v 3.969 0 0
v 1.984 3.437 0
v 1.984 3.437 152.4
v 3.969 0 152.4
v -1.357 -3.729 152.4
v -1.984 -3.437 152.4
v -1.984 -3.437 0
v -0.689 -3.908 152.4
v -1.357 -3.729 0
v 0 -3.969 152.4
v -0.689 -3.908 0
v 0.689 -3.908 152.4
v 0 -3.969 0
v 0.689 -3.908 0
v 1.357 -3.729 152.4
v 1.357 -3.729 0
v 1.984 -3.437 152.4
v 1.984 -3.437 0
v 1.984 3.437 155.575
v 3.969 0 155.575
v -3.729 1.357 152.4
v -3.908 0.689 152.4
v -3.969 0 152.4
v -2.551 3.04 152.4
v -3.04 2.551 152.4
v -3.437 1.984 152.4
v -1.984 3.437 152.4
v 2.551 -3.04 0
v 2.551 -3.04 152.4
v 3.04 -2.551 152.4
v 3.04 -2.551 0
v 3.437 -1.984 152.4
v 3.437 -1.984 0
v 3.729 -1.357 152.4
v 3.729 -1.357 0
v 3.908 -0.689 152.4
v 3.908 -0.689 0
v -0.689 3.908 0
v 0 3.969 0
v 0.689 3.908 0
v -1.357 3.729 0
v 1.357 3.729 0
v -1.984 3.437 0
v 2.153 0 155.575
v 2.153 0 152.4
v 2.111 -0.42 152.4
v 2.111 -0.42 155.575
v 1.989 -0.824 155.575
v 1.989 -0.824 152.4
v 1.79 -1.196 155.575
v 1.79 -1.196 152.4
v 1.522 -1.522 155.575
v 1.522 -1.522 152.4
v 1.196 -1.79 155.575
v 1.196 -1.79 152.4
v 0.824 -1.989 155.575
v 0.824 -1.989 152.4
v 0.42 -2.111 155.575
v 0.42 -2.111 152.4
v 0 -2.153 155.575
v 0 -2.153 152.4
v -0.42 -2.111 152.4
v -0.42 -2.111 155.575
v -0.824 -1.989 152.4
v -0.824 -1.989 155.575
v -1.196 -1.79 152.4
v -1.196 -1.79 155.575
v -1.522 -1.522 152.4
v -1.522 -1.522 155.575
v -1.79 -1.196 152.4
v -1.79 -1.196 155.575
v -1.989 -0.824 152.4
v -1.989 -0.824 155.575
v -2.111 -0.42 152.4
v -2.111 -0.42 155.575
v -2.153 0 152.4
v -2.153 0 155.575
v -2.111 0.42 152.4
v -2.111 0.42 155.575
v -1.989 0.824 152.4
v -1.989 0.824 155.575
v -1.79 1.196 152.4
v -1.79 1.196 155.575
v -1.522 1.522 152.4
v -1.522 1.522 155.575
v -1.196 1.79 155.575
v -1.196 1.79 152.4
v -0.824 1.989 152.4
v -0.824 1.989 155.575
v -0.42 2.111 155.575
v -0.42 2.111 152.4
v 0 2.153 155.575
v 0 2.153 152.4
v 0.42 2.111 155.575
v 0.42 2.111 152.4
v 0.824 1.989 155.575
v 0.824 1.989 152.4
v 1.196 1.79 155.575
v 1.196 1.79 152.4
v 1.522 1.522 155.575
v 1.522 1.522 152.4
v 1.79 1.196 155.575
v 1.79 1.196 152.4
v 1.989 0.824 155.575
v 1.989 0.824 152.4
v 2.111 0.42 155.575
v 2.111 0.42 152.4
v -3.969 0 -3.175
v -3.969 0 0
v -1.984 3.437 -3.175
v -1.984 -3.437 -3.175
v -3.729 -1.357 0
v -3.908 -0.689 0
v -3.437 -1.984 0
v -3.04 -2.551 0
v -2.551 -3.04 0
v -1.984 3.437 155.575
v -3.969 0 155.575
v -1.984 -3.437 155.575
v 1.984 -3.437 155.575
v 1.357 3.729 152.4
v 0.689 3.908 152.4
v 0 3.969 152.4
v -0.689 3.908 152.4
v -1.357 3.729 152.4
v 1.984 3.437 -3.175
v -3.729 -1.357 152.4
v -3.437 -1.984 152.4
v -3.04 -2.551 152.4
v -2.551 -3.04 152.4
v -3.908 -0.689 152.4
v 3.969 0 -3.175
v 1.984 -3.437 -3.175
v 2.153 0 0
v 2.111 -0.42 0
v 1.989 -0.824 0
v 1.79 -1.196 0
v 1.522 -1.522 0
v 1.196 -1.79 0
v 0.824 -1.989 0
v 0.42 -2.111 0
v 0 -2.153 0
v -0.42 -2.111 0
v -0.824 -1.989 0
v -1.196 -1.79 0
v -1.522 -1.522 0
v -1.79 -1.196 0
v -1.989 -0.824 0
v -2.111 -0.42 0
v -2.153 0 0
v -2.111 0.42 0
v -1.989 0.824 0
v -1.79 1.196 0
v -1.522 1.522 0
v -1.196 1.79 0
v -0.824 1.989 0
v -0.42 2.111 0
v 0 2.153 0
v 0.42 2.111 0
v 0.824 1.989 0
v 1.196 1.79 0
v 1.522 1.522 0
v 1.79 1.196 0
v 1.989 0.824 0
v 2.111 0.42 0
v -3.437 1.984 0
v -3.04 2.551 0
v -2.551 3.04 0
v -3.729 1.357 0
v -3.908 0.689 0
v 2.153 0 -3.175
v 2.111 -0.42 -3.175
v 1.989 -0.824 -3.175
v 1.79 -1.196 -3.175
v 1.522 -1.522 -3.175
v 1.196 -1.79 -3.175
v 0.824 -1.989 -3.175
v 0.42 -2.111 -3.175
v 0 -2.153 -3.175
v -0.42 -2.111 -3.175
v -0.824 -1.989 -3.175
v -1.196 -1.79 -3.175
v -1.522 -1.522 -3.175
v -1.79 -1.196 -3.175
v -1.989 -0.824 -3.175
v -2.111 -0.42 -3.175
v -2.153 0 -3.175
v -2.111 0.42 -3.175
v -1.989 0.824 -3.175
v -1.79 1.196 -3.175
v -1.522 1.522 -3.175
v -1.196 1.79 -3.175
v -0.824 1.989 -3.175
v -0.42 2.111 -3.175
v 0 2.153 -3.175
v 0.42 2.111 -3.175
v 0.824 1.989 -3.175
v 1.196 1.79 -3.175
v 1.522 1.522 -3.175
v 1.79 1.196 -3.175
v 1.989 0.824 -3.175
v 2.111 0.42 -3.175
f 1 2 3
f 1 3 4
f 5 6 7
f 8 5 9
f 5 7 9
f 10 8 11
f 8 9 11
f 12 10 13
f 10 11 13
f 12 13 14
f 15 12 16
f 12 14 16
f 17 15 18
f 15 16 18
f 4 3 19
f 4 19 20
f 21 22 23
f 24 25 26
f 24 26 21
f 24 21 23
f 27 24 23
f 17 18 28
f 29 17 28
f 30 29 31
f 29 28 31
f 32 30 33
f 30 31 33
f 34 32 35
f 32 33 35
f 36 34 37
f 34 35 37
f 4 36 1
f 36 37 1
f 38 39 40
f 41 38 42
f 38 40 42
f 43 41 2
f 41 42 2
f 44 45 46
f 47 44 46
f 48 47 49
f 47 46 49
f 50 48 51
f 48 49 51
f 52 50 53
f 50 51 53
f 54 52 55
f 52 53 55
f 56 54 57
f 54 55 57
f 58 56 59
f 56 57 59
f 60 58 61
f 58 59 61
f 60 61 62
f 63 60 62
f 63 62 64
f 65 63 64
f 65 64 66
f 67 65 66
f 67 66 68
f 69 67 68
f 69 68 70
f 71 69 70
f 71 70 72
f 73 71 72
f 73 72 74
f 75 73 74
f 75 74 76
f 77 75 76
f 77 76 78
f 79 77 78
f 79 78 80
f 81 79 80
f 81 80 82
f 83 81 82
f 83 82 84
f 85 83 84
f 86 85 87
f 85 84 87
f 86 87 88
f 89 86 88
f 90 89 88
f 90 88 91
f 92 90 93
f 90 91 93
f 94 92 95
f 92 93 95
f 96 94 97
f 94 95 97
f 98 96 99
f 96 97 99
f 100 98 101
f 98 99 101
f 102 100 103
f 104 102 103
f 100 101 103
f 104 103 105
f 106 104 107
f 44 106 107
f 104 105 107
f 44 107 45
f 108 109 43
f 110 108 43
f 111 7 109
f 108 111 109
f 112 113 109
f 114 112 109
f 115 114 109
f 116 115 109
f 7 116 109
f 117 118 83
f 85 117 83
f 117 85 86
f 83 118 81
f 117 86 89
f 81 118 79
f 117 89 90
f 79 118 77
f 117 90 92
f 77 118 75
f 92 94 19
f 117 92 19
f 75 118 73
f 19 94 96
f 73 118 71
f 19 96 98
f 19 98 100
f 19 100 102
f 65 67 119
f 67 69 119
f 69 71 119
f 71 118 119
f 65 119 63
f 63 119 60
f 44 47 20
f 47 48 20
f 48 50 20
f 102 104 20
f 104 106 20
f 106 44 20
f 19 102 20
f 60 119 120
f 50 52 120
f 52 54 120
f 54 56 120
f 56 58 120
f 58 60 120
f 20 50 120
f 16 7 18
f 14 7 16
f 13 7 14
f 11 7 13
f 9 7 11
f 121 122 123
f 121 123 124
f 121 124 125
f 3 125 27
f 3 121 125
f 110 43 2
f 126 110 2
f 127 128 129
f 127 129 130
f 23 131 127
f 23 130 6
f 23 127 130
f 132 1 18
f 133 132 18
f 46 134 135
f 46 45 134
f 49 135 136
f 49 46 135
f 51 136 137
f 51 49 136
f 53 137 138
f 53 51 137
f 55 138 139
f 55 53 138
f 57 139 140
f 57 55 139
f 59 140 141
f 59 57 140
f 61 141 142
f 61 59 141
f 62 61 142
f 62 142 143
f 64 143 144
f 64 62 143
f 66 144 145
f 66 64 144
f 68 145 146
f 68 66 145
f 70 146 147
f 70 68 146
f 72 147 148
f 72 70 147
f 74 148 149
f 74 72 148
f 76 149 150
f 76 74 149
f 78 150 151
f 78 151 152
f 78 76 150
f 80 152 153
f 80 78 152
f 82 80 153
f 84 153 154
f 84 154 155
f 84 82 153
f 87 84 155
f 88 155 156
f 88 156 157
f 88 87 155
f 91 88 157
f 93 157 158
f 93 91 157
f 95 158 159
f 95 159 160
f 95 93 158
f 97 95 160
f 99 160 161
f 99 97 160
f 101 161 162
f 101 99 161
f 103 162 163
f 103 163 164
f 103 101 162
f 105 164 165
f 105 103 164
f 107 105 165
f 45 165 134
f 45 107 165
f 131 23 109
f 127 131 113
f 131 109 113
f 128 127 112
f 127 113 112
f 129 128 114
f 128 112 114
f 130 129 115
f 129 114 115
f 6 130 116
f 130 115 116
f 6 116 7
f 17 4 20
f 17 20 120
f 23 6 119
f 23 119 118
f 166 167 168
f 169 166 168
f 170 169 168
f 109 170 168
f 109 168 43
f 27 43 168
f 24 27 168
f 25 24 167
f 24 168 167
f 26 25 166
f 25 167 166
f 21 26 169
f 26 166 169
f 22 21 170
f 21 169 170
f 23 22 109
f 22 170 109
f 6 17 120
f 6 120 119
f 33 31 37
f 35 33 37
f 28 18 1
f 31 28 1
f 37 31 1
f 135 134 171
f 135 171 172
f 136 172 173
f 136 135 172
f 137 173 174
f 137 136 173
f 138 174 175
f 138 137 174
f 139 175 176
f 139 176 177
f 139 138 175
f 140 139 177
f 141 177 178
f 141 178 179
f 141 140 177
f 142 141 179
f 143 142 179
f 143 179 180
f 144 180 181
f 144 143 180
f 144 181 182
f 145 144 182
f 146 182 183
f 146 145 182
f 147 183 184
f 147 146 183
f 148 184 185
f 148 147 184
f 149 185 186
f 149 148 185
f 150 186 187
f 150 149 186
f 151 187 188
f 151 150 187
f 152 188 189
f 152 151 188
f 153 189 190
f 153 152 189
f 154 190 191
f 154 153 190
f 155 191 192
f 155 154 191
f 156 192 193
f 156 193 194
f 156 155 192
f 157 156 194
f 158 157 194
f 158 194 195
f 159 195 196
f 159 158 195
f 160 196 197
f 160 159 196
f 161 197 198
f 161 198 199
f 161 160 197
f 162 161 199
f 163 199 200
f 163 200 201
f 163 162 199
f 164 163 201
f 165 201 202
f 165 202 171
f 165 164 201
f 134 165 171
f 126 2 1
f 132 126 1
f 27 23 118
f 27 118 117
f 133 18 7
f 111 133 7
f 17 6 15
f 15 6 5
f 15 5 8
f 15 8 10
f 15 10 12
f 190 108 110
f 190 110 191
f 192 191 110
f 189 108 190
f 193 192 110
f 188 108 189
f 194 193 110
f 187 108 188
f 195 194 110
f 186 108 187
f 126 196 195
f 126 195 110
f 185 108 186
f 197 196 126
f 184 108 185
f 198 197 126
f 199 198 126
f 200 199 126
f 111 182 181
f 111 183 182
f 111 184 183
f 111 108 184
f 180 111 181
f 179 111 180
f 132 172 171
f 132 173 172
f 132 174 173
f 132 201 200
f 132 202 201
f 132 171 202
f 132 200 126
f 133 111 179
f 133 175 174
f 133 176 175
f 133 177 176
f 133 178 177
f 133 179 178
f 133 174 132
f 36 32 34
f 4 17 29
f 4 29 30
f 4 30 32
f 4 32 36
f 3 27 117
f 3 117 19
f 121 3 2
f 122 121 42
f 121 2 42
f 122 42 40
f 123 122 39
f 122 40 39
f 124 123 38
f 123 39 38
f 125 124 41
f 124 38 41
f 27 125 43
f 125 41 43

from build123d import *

# Parameters (mm, degrees)
F0_R          = 3.96875
F0_R_2        = 2.15265
F1_DEPTH      = 152.4
F3_R          = 2.15265
F4_DEPTH      = 3.175
F4_DEPTH_BACK = 155.575
F5_DEPTH      = 152.4


with BuildPart() as f1:
    # F0 (on Top) → F1 (new body)
    with BuildSketch(Plane.XY):
        Circle(F0_R)
        Circle(F0_R_2, mode=Mode.SUBTRACT)
    extrude(amount=F1_DEPTH)

    # F3 (on face) → F4 (join, two sides)
    with BuildSketch(Plane(origin=(0, 0, 0), x_dir=(1, 0, 0), z_dir=(0, 0, -1))) as f4_sk:
        Polygon((1.984375, -3.4370383213), (3.96875, 0), (1.984375, 3.4370383213), (-1.984375, 3.4370383213), (-3.96875, 0), (-1.984375, -3.4370383213), align=None)
        Circle(F3_R, mode=Mode.SUBTRACT)
    extrude(amount=F4_DEPTH)
    extrude(f4_sk.sketch, amount=-F4_DEPTH_BACK)

    # F5 (cut, through all): a face of the model
    f5_faces = [f1.faces().sort_by_distance(p)[0] for p in [
        (3.1618531236, 1.8254967521, 0),
    ]]
    extrude(f5_faces, amount=-F5_DEPTH, mode=Mode.SUBTRACT)


solid = f1.part
